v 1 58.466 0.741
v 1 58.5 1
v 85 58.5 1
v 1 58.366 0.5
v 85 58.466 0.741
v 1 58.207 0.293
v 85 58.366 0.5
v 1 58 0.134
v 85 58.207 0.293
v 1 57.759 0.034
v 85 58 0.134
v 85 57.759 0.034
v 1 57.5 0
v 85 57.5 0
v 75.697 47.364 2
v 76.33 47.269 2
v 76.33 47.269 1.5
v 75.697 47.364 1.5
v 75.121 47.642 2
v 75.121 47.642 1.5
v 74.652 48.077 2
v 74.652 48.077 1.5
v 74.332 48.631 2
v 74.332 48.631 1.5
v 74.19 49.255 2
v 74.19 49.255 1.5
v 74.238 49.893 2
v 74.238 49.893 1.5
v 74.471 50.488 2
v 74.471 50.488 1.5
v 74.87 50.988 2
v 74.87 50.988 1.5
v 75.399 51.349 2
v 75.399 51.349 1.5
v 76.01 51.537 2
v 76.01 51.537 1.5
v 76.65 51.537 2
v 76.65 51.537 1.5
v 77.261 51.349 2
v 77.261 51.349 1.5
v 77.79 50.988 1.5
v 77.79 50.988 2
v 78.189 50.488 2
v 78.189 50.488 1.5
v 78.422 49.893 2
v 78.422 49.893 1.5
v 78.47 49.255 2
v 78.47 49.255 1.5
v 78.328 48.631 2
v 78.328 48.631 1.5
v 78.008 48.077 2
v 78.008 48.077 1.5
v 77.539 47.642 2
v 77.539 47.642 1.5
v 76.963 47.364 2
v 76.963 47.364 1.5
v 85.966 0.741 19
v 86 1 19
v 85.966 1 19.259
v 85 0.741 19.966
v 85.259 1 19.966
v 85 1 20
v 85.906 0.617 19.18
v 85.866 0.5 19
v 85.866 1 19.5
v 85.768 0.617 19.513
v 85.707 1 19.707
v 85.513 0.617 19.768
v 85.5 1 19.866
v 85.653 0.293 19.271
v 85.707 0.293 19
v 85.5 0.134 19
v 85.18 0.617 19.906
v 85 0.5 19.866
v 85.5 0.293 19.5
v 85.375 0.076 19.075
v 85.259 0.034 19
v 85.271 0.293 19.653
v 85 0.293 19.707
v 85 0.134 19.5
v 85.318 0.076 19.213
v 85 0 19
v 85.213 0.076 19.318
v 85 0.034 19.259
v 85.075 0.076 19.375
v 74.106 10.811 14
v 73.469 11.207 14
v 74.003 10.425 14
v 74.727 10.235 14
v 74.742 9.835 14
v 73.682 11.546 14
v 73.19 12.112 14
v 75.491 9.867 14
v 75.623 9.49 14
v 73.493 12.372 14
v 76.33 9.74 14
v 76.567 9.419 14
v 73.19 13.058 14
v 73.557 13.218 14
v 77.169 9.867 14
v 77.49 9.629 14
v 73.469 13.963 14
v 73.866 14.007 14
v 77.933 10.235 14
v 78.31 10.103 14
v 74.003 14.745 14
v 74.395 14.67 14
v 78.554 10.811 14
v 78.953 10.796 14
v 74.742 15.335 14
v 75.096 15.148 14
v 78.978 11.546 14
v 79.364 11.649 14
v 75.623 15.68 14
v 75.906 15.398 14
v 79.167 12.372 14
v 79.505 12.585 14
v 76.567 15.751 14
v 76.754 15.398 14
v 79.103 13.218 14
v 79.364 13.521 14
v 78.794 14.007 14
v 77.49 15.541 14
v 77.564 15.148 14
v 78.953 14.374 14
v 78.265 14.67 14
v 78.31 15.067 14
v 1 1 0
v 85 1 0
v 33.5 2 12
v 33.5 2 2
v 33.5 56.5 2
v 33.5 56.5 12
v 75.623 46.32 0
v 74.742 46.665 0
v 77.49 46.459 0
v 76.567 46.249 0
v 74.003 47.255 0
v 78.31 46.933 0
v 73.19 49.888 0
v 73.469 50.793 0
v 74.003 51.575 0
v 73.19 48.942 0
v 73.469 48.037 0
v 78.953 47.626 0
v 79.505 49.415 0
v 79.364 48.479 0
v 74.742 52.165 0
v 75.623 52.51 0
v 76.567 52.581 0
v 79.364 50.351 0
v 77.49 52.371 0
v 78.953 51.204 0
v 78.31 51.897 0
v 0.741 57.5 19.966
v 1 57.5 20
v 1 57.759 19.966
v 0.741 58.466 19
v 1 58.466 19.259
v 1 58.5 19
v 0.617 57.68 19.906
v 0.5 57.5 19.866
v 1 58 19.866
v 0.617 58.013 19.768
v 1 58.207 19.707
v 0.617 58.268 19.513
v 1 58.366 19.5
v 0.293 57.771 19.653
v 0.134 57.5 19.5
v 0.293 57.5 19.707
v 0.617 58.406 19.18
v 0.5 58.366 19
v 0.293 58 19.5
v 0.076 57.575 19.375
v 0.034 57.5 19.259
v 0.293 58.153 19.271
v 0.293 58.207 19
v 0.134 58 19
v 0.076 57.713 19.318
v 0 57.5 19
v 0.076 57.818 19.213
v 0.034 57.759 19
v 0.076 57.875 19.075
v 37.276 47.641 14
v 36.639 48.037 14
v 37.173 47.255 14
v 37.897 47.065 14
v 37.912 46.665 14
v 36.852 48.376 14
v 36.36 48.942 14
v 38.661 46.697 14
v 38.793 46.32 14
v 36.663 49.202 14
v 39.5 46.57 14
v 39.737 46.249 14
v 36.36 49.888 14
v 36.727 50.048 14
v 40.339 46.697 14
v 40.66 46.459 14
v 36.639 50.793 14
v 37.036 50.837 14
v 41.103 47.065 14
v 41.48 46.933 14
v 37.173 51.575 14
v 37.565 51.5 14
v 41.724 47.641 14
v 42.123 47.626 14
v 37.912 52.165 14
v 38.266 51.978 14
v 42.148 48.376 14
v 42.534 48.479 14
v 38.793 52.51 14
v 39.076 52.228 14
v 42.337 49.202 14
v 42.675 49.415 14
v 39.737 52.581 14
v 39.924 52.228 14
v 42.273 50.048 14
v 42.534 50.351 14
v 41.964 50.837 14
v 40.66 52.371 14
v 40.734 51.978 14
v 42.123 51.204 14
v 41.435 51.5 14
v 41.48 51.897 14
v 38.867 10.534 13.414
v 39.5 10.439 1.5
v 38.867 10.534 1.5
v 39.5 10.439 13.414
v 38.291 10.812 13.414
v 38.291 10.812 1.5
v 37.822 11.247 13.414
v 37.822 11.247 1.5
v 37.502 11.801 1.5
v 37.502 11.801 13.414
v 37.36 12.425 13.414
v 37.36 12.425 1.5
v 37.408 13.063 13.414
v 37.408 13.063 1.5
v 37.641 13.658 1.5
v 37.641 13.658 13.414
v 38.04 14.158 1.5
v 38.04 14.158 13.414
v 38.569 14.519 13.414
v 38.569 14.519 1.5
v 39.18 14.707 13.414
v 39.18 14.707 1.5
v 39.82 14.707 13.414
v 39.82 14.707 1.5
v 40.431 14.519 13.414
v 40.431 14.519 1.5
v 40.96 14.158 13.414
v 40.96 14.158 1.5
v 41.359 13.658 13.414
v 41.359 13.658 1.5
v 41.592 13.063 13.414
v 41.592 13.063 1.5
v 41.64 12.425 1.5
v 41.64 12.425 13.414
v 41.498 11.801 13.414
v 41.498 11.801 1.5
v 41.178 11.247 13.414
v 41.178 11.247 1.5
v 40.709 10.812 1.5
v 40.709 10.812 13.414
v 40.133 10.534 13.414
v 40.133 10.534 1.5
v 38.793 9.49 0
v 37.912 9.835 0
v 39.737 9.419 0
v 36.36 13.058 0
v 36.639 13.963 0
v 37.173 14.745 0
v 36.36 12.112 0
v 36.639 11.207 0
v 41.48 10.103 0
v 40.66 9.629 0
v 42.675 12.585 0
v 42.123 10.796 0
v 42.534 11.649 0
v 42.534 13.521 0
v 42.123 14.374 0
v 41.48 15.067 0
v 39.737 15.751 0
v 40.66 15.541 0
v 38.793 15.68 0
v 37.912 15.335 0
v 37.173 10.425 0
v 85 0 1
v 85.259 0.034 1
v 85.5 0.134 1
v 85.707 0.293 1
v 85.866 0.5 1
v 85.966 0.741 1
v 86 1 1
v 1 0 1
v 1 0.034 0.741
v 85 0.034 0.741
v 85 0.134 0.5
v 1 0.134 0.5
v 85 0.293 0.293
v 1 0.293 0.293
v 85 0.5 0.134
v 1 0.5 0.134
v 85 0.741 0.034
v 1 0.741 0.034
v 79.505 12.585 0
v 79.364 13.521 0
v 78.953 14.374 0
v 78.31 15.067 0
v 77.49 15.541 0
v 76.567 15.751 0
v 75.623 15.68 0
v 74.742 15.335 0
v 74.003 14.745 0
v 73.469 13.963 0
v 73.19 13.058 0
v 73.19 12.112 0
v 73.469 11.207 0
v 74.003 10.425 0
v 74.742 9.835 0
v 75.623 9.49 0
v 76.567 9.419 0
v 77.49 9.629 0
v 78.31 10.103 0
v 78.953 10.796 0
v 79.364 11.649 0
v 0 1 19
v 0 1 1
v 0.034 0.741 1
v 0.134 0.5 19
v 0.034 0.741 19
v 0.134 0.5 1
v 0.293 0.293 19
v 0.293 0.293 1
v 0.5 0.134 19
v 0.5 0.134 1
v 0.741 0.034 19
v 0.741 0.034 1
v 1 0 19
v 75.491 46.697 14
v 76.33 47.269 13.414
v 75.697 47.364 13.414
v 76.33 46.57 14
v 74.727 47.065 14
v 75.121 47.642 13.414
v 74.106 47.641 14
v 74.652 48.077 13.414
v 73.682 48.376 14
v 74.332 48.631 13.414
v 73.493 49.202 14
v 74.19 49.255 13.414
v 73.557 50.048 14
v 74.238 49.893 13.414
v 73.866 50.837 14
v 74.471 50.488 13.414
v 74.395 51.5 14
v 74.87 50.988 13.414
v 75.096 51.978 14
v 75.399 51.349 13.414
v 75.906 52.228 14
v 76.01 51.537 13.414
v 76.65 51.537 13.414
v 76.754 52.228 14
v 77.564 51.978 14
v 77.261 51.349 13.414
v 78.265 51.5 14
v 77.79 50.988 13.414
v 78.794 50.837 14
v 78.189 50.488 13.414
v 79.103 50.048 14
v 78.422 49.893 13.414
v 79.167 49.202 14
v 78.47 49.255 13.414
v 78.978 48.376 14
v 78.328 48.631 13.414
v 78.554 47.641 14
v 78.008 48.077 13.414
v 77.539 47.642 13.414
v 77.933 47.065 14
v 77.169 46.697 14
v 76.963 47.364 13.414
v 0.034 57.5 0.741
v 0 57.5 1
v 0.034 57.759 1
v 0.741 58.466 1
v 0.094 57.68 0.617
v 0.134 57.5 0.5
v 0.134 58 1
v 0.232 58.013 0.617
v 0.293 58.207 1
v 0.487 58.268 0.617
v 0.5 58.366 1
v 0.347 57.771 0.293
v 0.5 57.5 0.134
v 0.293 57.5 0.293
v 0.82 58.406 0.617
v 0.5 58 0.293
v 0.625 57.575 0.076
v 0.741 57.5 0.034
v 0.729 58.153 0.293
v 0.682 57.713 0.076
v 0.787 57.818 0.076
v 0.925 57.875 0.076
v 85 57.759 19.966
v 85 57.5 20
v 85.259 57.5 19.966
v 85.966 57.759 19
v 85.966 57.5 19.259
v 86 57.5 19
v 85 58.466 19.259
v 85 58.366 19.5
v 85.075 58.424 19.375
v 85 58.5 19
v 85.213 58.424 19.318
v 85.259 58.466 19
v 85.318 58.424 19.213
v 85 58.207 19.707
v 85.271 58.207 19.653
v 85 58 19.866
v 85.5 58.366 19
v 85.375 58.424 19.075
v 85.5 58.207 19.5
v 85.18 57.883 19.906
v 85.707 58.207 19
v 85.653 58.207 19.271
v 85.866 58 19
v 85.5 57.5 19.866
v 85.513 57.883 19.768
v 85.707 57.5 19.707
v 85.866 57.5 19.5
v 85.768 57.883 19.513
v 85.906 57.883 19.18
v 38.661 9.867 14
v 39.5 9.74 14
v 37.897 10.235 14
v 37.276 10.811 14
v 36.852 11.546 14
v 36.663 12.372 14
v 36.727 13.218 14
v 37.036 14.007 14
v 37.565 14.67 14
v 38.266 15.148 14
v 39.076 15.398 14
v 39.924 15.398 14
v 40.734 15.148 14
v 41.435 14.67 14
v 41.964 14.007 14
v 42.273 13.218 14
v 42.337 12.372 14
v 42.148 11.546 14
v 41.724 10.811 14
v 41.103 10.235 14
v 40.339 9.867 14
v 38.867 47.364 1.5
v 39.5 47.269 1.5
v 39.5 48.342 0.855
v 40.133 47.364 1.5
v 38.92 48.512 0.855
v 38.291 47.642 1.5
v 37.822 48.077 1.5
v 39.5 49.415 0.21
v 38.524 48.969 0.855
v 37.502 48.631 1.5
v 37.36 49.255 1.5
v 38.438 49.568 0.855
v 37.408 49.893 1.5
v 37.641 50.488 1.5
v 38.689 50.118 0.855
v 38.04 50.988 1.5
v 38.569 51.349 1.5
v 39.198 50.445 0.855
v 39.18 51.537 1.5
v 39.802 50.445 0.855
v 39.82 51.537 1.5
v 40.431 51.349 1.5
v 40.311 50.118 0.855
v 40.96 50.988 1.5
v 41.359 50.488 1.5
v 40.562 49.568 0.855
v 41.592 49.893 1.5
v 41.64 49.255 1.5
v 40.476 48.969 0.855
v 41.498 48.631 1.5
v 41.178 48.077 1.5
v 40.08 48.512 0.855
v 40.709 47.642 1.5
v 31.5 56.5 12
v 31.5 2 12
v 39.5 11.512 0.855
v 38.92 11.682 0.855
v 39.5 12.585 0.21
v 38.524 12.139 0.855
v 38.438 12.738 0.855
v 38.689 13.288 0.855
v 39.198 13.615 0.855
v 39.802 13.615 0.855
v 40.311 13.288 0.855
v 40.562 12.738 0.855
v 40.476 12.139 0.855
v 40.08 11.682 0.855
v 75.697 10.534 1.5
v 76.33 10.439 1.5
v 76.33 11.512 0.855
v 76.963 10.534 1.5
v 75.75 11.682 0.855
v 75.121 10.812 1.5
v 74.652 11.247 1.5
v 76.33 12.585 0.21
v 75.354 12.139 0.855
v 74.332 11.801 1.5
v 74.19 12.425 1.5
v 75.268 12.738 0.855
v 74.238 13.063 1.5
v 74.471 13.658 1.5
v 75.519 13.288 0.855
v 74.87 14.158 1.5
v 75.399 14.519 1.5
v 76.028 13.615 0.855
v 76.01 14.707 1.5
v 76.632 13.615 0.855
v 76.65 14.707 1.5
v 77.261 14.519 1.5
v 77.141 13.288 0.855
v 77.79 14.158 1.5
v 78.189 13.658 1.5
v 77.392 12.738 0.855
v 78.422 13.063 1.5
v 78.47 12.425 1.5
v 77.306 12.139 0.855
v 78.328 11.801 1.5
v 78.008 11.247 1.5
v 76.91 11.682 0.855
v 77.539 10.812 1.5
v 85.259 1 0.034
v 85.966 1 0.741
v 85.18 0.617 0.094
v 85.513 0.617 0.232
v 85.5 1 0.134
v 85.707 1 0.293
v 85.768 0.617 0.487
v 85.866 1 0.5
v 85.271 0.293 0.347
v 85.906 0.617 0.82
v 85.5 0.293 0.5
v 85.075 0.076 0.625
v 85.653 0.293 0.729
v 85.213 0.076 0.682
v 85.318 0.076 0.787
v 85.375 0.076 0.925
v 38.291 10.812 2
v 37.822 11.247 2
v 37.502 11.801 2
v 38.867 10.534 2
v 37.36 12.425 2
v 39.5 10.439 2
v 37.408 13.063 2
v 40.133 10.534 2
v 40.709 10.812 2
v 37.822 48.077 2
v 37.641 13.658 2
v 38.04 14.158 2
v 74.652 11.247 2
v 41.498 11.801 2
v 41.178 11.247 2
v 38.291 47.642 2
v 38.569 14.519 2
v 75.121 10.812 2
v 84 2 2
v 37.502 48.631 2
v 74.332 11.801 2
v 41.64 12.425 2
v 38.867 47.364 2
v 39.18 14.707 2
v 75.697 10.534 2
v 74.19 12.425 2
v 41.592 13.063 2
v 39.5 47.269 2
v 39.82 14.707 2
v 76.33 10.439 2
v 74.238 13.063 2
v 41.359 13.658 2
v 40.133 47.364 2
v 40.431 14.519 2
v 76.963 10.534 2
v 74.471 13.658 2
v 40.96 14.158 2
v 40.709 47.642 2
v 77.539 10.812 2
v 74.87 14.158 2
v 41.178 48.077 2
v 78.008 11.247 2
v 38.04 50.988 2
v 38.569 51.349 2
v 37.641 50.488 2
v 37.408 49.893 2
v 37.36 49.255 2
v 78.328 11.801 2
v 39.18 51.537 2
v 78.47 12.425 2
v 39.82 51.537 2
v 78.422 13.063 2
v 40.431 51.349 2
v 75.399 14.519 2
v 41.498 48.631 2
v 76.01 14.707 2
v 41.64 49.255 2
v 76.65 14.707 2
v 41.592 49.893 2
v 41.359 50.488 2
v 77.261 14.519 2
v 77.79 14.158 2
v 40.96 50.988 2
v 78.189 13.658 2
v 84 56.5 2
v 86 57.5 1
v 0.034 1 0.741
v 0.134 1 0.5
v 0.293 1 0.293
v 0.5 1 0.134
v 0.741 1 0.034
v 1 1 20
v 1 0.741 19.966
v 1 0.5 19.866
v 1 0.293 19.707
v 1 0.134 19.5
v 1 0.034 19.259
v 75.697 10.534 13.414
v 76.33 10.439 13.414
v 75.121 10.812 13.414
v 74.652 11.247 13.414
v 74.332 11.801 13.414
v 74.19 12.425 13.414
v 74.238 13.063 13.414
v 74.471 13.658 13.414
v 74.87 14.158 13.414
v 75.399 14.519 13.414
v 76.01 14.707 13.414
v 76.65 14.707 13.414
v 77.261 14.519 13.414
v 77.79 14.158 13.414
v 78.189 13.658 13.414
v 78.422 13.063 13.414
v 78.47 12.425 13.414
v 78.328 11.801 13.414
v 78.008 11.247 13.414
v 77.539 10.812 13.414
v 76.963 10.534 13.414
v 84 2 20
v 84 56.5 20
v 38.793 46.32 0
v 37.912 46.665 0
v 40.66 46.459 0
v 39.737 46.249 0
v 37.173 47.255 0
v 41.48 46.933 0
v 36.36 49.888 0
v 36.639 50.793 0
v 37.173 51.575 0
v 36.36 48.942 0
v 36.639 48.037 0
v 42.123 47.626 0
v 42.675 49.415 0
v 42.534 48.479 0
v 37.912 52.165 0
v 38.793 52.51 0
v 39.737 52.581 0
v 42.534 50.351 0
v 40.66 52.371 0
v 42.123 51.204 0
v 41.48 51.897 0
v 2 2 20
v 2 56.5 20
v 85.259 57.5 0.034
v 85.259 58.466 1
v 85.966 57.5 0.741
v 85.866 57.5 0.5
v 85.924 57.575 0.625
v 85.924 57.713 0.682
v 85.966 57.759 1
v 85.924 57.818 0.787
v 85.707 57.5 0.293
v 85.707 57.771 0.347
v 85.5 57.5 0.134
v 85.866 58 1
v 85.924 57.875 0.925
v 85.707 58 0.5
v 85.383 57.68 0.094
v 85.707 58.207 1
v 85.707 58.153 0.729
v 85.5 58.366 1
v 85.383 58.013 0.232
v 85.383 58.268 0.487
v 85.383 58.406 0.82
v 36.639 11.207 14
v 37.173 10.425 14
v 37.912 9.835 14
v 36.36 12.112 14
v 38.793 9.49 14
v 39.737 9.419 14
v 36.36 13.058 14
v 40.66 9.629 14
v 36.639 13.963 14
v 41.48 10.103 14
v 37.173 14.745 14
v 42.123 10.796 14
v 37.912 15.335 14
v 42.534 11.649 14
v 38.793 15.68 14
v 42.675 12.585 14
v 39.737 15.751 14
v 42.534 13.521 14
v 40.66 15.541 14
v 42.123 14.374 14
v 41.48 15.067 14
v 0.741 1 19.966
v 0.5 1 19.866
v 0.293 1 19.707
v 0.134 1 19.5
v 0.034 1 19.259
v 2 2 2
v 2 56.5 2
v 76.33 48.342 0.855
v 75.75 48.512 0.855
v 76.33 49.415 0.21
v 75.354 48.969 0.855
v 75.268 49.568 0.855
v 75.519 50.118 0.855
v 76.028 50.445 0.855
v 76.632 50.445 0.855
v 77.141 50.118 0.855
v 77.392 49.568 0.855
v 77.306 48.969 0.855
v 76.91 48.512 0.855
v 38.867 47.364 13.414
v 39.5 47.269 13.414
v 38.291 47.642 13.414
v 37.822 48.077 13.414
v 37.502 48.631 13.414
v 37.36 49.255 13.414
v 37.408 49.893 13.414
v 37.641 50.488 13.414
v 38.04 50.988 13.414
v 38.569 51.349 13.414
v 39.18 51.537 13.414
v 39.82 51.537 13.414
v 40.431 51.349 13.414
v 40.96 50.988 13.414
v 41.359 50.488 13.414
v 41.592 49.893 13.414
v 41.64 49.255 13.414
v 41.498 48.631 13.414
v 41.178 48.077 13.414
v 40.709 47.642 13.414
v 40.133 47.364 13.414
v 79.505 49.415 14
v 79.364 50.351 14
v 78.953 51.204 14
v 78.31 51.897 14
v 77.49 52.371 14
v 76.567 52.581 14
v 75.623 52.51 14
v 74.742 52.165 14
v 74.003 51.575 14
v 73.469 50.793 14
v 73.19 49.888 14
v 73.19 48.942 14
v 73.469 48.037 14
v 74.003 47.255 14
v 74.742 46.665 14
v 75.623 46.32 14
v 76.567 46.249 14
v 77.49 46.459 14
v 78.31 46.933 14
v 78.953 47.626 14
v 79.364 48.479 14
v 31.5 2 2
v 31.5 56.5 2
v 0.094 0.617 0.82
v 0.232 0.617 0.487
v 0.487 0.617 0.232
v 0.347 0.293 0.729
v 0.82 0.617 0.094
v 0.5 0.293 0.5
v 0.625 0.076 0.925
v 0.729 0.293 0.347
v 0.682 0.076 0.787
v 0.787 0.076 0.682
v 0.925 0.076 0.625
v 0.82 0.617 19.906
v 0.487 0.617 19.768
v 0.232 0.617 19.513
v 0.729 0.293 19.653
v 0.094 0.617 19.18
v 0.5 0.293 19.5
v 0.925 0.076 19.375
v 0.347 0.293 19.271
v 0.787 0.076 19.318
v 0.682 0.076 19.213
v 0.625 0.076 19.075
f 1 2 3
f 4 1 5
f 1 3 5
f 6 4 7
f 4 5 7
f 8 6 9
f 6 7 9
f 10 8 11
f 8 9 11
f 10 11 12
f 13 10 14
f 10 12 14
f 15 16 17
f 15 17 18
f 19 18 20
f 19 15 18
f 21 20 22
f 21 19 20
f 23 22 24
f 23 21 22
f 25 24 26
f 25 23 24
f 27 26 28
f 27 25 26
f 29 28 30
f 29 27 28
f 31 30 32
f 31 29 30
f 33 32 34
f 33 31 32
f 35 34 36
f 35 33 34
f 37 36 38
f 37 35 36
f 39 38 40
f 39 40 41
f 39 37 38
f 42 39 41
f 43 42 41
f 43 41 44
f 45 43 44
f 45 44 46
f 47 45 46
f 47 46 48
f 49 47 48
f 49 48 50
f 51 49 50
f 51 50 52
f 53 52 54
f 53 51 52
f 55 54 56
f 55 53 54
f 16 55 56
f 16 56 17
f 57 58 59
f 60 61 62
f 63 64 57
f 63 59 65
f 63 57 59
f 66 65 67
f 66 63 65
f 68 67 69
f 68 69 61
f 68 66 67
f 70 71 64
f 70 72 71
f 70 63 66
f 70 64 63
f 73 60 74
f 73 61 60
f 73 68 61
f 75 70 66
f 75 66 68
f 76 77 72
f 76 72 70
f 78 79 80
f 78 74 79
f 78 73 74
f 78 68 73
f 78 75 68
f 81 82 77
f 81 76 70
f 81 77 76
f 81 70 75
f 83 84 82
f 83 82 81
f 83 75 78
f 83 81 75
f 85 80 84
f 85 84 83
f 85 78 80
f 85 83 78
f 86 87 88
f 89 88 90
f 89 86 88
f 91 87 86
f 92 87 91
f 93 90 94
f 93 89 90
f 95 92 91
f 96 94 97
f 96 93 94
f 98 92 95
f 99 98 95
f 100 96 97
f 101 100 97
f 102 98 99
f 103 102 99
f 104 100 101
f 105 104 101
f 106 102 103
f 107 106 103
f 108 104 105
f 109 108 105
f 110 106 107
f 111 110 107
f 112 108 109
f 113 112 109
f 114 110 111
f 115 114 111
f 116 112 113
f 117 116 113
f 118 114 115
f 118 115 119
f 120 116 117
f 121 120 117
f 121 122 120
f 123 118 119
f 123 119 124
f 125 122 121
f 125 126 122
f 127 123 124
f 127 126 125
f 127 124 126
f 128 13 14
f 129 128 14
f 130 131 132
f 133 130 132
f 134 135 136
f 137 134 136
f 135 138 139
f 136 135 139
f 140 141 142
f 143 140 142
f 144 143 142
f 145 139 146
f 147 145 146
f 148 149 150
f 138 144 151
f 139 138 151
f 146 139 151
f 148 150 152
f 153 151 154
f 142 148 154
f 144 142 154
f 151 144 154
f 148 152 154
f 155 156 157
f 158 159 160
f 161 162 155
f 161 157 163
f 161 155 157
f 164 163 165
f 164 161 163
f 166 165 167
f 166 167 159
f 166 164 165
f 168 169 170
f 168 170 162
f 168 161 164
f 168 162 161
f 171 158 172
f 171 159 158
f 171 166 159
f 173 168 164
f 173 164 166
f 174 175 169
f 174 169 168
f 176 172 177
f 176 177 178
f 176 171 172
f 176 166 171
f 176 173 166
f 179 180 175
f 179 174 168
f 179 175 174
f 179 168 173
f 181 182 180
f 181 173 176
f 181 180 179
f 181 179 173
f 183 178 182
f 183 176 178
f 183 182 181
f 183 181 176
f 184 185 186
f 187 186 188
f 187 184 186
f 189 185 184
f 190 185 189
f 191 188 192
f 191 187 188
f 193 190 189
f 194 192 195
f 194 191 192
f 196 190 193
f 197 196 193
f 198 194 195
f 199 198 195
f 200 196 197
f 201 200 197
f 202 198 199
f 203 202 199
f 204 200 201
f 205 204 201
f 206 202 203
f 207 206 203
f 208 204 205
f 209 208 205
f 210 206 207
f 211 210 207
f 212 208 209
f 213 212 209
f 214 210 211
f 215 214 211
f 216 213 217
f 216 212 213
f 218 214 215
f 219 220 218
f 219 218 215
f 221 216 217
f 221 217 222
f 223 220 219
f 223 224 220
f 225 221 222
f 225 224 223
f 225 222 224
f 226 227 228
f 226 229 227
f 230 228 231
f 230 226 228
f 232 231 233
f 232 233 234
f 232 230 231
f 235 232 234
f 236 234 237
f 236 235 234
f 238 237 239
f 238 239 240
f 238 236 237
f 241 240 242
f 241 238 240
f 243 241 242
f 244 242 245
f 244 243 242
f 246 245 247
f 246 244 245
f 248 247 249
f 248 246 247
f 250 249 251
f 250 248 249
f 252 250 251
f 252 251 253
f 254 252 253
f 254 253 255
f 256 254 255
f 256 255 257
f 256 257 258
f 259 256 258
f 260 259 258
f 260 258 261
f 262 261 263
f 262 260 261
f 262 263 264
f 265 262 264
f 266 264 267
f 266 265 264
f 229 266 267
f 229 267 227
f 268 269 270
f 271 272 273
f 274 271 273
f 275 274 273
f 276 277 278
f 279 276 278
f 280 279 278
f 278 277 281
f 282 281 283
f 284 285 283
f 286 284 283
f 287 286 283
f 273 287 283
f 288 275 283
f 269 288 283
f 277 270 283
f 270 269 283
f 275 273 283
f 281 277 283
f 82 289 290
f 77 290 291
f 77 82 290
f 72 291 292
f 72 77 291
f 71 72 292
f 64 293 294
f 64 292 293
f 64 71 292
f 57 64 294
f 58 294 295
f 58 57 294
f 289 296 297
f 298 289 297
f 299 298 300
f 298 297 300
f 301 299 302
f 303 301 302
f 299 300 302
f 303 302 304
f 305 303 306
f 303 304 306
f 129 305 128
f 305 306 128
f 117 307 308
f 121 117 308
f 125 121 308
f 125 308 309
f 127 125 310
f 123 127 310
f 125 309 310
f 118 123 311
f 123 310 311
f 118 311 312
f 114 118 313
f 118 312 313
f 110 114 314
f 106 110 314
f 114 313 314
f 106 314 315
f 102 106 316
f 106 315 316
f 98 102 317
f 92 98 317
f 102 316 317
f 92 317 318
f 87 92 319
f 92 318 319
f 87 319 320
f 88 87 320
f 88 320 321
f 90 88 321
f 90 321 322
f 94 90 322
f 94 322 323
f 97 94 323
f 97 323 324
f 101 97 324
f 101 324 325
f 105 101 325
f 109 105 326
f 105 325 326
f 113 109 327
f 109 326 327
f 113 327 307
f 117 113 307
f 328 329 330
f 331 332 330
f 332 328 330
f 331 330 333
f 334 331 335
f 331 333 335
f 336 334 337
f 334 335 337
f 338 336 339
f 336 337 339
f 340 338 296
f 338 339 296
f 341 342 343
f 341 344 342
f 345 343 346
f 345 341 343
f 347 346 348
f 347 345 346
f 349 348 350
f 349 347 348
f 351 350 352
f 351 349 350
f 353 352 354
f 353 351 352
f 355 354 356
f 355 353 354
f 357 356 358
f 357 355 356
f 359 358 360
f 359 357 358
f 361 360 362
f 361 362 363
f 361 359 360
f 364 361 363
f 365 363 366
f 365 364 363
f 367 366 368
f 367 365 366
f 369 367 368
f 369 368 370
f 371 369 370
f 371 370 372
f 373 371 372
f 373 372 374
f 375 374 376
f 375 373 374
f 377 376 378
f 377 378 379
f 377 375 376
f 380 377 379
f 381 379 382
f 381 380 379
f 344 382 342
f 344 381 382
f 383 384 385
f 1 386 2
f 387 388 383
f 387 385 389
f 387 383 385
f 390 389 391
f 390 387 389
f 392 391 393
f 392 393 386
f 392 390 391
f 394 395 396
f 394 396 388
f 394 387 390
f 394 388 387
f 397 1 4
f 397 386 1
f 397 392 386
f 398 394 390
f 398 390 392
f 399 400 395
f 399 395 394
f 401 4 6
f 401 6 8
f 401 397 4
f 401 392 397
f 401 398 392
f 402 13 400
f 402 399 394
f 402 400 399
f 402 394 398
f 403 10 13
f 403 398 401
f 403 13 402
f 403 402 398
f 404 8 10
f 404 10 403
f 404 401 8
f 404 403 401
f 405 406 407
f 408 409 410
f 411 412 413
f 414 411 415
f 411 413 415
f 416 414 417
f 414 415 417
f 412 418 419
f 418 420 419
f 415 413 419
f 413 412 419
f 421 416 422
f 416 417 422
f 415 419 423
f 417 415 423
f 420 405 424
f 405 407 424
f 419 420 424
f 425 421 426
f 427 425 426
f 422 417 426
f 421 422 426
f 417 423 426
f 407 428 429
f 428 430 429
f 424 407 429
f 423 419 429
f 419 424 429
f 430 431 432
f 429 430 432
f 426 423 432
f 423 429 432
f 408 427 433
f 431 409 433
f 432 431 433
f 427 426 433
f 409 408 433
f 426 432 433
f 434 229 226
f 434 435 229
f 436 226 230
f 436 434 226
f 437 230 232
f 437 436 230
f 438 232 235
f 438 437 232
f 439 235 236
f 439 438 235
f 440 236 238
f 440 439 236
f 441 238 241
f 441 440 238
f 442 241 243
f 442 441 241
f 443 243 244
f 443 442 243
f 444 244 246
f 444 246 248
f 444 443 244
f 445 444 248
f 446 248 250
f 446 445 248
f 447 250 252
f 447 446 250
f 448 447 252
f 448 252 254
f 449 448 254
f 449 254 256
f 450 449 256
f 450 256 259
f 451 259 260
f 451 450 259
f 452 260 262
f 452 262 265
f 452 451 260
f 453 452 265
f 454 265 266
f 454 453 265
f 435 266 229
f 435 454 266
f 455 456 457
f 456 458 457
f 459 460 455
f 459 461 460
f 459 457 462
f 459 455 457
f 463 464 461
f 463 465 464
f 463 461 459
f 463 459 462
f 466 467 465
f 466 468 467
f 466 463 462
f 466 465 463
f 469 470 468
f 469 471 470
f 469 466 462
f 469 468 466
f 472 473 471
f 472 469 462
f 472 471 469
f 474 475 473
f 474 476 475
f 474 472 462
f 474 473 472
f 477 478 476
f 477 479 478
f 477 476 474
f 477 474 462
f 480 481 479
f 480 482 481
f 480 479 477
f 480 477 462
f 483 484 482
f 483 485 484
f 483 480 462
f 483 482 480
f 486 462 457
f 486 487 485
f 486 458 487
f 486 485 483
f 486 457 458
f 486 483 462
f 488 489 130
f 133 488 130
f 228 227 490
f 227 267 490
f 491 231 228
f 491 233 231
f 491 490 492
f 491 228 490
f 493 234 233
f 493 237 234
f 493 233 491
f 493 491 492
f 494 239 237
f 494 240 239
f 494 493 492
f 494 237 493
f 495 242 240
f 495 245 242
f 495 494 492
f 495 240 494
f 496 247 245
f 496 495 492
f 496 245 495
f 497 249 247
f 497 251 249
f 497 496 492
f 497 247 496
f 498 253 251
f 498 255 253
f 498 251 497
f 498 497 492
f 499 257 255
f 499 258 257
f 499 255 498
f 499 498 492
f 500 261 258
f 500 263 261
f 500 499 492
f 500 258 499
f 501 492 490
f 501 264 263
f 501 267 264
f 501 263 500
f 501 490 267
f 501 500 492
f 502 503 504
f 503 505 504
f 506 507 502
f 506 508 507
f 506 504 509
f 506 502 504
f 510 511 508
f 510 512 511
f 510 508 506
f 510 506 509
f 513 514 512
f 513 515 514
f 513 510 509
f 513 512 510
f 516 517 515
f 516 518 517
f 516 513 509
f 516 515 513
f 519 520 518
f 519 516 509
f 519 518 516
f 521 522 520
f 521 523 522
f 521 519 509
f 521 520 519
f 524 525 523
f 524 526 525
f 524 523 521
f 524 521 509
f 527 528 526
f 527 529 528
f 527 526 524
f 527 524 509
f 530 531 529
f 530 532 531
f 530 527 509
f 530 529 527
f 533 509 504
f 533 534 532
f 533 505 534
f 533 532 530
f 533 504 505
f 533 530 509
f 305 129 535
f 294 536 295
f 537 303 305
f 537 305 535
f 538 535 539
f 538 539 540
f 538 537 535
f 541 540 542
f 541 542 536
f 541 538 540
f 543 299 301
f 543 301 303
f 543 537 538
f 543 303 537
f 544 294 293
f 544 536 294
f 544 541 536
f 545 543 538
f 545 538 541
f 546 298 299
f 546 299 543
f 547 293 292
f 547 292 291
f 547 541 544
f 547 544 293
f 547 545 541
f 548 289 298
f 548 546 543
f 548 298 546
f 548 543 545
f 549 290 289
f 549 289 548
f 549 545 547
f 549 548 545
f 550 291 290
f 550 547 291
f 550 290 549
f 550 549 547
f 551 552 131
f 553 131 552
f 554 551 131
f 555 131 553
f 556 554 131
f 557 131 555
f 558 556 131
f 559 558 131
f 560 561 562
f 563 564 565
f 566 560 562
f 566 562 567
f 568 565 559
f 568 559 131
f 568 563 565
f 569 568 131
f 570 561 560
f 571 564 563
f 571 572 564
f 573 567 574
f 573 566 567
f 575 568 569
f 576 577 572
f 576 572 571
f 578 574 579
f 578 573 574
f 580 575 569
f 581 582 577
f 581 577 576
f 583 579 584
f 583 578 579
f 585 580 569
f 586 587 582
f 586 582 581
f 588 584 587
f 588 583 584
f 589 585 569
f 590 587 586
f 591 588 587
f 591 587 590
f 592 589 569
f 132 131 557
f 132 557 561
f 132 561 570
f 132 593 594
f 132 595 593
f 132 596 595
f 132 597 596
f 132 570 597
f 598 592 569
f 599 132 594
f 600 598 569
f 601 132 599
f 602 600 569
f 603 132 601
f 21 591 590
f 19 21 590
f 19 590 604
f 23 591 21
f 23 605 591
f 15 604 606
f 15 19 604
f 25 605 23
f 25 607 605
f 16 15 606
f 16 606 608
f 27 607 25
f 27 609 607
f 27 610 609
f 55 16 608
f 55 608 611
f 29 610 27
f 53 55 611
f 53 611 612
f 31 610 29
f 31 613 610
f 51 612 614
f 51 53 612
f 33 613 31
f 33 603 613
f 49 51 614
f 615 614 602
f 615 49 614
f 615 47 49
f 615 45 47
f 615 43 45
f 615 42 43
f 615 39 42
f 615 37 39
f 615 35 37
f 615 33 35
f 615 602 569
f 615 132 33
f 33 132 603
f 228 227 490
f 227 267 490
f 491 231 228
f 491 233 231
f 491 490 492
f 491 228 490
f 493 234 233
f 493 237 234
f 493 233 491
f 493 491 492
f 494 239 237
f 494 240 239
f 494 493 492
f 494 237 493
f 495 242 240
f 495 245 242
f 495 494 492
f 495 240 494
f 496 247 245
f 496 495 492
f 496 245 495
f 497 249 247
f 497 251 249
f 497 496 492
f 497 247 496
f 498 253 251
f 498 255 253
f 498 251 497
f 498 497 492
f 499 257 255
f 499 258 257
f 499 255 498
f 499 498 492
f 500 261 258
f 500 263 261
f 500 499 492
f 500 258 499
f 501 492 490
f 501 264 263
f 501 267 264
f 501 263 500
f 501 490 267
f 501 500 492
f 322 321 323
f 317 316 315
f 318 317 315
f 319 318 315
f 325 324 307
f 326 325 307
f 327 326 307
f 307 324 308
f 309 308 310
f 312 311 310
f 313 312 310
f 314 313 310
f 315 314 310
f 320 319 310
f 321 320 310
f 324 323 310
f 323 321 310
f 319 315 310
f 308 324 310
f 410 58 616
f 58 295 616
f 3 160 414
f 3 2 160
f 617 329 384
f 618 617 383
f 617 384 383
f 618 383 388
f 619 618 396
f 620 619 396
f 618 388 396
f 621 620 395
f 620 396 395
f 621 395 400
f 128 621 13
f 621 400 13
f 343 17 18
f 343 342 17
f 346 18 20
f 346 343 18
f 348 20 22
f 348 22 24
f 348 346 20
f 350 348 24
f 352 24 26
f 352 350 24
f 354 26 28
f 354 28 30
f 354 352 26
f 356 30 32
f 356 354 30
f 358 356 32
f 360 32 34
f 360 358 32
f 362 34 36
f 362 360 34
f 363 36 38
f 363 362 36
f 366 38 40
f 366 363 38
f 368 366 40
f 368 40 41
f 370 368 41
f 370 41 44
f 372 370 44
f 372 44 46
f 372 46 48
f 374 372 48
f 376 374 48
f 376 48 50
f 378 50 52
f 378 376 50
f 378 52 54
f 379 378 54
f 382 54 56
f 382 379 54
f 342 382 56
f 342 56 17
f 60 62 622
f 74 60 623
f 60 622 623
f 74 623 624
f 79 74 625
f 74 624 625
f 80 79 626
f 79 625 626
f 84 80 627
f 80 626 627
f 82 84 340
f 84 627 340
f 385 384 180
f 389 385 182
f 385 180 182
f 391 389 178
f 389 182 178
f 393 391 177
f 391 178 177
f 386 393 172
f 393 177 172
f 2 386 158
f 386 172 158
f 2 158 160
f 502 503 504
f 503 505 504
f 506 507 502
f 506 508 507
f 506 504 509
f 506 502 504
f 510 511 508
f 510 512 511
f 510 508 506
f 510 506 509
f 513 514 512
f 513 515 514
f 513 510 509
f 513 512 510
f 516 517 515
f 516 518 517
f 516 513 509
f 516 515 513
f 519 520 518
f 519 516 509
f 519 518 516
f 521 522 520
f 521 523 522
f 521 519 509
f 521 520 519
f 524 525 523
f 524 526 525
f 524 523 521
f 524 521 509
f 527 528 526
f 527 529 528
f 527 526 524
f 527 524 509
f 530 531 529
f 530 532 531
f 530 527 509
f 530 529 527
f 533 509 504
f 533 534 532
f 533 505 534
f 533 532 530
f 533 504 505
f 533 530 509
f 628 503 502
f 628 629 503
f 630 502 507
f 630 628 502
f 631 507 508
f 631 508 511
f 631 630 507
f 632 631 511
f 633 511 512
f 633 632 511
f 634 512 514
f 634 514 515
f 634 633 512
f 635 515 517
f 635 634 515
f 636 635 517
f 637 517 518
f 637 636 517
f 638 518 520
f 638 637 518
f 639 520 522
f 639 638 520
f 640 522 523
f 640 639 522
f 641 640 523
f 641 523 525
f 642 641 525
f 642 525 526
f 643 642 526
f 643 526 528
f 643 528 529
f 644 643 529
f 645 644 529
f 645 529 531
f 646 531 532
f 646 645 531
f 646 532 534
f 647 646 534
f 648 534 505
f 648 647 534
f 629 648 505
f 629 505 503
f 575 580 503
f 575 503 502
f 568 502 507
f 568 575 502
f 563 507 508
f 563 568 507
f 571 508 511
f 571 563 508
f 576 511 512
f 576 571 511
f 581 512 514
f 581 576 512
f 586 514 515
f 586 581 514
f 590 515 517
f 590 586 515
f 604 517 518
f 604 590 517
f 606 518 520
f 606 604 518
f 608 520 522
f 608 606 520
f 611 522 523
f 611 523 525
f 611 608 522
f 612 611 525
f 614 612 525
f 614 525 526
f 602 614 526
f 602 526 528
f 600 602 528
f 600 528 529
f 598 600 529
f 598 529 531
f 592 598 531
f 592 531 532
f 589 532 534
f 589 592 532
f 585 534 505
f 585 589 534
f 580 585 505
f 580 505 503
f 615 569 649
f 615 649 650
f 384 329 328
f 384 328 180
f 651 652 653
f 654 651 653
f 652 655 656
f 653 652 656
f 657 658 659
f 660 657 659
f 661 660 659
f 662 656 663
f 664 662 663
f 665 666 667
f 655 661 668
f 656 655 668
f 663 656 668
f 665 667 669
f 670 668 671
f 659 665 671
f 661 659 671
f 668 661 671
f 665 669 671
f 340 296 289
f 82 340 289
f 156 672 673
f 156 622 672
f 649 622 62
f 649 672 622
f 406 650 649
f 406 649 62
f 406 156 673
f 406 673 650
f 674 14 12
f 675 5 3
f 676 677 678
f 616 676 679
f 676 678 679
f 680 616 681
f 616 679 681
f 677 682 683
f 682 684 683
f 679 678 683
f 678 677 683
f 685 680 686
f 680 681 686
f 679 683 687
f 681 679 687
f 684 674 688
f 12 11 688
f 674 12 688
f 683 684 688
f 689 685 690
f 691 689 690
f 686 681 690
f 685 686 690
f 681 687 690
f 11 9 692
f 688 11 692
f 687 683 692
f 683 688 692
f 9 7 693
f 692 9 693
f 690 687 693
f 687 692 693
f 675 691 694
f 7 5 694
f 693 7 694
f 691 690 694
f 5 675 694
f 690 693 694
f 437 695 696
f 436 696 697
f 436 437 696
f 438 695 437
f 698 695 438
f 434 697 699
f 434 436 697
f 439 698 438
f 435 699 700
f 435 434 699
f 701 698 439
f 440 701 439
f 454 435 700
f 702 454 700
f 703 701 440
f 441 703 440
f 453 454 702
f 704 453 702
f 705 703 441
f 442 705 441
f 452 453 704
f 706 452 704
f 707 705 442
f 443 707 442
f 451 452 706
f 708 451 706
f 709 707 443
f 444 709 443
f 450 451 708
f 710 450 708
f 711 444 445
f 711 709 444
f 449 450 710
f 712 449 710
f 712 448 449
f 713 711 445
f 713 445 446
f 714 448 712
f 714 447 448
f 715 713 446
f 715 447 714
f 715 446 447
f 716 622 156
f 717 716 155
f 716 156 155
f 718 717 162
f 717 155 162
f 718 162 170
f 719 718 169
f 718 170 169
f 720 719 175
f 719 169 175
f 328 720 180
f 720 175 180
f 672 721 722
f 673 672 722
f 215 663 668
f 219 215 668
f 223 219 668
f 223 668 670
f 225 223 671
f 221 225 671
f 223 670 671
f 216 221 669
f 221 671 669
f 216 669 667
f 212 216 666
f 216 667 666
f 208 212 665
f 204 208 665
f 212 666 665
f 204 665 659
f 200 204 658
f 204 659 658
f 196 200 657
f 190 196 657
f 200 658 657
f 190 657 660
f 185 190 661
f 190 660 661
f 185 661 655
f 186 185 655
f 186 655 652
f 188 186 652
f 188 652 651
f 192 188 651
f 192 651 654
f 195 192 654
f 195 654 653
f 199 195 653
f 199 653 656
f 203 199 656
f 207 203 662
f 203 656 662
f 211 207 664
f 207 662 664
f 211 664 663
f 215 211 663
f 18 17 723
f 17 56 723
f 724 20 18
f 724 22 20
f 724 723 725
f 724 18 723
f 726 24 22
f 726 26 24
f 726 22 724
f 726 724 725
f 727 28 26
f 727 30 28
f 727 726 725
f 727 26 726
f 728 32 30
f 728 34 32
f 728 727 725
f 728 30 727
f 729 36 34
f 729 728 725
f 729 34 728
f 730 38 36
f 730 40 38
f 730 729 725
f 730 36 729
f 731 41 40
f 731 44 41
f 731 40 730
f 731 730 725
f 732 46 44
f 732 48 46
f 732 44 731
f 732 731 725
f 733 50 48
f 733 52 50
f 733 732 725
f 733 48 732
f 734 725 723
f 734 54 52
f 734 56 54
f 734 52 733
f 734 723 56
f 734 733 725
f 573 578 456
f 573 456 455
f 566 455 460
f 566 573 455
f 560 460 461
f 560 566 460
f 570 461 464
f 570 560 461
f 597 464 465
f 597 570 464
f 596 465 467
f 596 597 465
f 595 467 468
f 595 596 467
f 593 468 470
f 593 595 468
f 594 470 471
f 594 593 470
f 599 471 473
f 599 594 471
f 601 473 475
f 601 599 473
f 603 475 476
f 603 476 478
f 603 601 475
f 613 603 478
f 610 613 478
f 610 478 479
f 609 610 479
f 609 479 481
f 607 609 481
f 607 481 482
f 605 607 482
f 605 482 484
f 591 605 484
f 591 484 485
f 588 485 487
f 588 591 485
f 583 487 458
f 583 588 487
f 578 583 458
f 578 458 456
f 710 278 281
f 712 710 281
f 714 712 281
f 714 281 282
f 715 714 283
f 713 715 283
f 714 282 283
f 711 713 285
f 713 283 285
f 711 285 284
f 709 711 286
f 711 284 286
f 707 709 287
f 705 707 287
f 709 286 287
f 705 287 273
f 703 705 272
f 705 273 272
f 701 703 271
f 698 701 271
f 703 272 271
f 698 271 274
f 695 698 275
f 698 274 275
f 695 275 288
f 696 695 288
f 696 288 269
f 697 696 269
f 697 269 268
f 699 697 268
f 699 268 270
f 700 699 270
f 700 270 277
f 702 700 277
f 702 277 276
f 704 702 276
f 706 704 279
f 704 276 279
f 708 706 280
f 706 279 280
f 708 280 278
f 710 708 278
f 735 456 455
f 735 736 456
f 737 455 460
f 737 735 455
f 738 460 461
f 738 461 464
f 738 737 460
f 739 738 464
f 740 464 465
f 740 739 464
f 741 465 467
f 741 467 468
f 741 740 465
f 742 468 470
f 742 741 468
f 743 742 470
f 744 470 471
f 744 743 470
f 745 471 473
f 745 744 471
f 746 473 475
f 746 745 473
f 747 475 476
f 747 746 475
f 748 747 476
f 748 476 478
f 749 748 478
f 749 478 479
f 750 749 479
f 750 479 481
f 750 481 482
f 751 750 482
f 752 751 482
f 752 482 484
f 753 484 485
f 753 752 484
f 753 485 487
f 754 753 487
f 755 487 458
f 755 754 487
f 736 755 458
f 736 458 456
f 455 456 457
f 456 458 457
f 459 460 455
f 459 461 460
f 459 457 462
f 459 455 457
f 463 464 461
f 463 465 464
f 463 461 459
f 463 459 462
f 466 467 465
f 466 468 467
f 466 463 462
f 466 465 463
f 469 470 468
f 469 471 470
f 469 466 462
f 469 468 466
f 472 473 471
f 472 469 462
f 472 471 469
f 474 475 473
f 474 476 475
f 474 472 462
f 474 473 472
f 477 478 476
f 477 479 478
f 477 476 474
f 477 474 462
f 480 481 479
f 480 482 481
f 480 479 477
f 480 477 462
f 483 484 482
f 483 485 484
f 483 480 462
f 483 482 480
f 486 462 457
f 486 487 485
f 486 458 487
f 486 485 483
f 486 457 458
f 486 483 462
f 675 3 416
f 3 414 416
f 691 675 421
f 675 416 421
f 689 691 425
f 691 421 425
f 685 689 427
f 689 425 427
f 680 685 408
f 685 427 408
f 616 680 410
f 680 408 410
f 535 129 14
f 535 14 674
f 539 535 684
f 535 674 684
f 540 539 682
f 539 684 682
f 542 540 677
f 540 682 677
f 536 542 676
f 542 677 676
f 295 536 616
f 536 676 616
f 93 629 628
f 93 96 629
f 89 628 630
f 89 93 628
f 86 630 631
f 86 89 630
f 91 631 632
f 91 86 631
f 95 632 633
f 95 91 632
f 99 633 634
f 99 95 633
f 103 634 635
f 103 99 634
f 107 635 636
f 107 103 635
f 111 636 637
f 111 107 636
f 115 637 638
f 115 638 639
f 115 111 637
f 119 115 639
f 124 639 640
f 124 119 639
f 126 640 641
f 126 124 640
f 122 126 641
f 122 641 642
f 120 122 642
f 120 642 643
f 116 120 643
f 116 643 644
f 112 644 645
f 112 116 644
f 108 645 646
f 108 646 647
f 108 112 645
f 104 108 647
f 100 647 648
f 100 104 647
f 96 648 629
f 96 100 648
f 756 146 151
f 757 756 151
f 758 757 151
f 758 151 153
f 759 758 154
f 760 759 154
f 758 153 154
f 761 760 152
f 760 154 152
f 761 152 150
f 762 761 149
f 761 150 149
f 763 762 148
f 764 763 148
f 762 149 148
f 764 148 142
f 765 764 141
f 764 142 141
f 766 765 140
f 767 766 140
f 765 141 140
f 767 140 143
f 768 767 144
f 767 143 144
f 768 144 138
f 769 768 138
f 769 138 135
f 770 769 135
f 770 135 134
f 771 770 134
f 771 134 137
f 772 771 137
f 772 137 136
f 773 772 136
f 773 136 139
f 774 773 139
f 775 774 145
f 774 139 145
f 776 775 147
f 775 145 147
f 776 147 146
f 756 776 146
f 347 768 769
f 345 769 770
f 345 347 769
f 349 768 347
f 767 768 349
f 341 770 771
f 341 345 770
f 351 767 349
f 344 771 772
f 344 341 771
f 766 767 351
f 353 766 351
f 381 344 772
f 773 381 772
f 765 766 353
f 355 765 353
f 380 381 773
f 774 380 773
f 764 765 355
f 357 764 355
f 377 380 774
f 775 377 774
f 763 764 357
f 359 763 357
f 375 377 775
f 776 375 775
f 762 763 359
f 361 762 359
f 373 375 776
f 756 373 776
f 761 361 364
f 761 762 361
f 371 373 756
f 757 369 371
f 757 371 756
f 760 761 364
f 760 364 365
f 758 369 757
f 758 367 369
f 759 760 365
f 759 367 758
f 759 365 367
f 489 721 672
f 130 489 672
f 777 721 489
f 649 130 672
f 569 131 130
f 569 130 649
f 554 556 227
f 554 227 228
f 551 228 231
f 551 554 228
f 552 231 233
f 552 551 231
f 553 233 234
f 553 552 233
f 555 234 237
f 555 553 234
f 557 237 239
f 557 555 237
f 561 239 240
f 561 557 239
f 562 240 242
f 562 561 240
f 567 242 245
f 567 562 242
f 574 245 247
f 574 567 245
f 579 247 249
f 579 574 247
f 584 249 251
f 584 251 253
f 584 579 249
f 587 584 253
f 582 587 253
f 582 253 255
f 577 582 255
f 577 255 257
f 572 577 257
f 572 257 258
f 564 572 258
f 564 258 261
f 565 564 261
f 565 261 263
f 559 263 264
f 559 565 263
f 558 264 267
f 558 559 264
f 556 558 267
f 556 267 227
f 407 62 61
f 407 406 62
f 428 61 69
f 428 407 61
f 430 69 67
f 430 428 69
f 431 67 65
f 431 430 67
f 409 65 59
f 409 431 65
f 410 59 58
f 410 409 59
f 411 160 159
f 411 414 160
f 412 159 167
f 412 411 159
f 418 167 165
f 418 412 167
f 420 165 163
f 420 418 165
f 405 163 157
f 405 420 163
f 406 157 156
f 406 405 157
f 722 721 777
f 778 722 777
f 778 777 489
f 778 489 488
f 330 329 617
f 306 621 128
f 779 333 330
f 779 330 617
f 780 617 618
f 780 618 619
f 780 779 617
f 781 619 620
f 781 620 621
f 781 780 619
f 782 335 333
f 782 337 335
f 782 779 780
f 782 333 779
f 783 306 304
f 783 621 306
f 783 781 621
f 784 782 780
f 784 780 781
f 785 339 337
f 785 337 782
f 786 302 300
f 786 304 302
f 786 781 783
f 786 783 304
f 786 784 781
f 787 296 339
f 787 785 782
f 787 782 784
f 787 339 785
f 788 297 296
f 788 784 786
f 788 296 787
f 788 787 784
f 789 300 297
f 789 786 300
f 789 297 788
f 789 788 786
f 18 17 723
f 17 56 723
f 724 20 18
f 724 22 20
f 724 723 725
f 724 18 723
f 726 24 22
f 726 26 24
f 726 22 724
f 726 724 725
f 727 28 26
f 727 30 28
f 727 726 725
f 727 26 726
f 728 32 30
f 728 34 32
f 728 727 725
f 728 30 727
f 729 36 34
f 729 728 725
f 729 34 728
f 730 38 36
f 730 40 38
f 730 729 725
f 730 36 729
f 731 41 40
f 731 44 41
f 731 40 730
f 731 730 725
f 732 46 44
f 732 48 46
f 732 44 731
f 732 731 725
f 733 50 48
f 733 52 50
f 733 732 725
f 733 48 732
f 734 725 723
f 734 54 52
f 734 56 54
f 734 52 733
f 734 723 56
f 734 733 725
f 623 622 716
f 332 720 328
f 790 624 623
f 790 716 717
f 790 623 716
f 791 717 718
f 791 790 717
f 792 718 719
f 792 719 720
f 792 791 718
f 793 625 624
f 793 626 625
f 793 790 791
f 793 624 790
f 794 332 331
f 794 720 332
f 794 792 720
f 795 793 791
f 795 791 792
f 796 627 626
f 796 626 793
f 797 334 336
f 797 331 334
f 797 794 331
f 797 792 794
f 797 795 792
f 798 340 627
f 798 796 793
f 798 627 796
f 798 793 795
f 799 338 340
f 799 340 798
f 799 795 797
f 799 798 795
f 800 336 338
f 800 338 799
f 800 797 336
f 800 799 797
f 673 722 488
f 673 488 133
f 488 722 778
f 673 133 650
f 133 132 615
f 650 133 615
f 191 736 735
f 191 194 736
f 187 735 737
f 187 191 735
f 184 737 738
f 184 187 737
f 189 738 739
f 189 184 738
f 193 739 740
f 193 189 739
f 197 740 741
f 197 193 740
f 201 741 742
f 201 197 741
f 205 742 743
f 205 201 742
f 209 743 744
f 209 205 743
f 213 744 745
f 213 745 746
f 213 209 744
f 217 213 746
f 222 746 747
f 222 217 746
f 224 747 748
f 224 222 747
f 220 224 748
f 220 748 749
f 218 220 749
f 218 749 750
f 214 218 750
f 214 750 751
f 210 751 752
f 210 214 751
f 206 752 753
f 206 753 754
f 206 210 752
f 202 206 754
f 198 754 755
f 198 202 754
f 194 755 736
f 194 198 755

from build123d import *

# Parameters (mm, degrees)
SKETCH1_W                           = 86
SKETCH1_H                           = 58.5
BOSS_EXTRUDE1_DEPTH                 = 20
SHELL1_T                            = -2
SKETCH4_W                           = 2
SKETCH4_H                           = 54.5
BOSS_EXTRUDE2_DEPTH                 = 10
FILLET2_R                           = 1
FILLET3_R                           = 1
SKETCH22_R                          = 3.175
BOSS_EXTRUDE10_DEPTH                = 14
BOSS_EXTRUDE10_2_DEPTH              = 14
BOSS_EXTRUDE10_3_DEPTH              = 14
BOSS_EXTRUDE10_4_DEPTH              = 14
F_4_0_209_DIAMETER_HOLE3_AT_2_COUNT = 2
F_4_0_209_DIAMETER_HOLE3_AT_2_PITCH = 36.83
F_4_0_209_DIAMETER_HOLE3_AT_3_COUNT = 2
F_4_0_209_DIAMETER_HOLE3_AT_3_PITCH = 52.085485502
F_4_0_209_DIAMETER_HOLE3_AT_4_COUNT = 2
F_4_0_209_DIAMETER_HOLE3_AT_4_PITCH = 36.83


with BuildPart() as part:
    # Sketch1 → Boss-Extrude1 (new body)
    with BuildSketch(Plane.XY):
        with Locations((43, 29.25)):
            Rectangle(SKETCH1_W, SKETCH1_H)
    extrude(amount=BOSS_EXTRUDE1_DEPTH)

    # Shell1
    shell1_openings = [part.faces().sort_by_distance(p)[0] for p in [
        (43, 29.25, 20),
    ]]
    offset(amount=SHELL1_T, openings=shell1_openings, kind=Kind.INTERSECTION)

    # Sketch4 → Boss-Extrude2 (add)
    with BuildSketch(Plane.XY.offset(2)):
        with Locations((32.5, 29.25)):
            Rectangle(SKETCH4_W, SKETCH4_H)
    extrude(amount=BOSS_EXTRUDE2_DEPTH)

    # Fillet2
    fillet2_edges = [part.edges().sort_by_distance(p)[0] for p in [
        (86, 29.25, 20),
        (43, 58.5, 20),
        (43, 58.5, 0),
        (86, 29.25, 0),
        (0, 58.5, 10),
        (86, 58.5, 10),
        (86, 0, 10),
    ]]
    fillet(fillet2_edges, radius=FILLET2_R)

    # Fillet3
    # the kernel refuses this fillet: 1 mm, written as the material it takes off along each edge
    with BuildSketch(Plane(origin=(85, 1, 1), x_dir=(0, 0, -1), z_dir=(0, -1, 0))) as fillet3_piece_1_section:
        Polygon((0, 0), (FILLET3_R, 0), (FILLET3_R, FILLET3_R), (0, FILLET3_R), align=None)
    fillet3_piece_1 = extrude(amount=FILLET3_R, mode=Mode.PRIVATE)
    fillet3_piece_1 = fillet3_piece_1 - Plane(origin=(85, 1, 1), x_dir=(-0.7071067811865475, 0, 0.7071067811865475), z_dir=(0, -1, 0)) * Sphere(FILLET3_R, mode=Mode.PRIVATE)
    add(fillet3_piece_1, mode=Mode.SUBTRACT)
    with BuildSketch(Plane(origin=(85, 1, 19), x_dir=(0, 0, 1), z_dir=(0, -1, 0))) as fillet3_piece_2_section:
        Polygon((0, 0), (FILLET3_R, 0), (FILLET3_R, -FILLET3_R), (0, -FILLET3_R), align=None)
    fillet3_piece_2 = extrude(amount=FILLET3_R, mode=Mode.PRIVATE)
    fillet3_piece_2 = fillet3_piece_2 - Plane(origin=(85, 1, 19), x_dir=(-0.7071067811865475, 0, -0.7071067811865475), z_dir=(0, -1, 0)) * Sphere(FILLET3_R, mode=Mode.PRIVATE)
    add(fillet3_piece_2, mode=Mode.SUBTRACT)
    with BuildSketch(Plane(origin=(1, 57.5, 1), x_dir=(-1, 0, 0), z_dir=(0, 0, -1))) as fillet3_piece_3_section:
        Polygon((0, 0), (FILLET3_R, 0), (FILLET3_R, FILLET3_R), (0, FILLET3_R), align=None)
    fillet3_piece_3 = extrude(amount=FILLET3_R, mode=Mode.PRIVATE)
    fillet3_piece_3 = fillet3_piece_3 - Plane(origin=(1, 57.5, 1), x_dir=(0.7071067811865475, -0.7071067811865475, 0), z_dir=(0, 0, -1)) * Sphere(FILLET3_R, mode=Mode.PRIVATE)
    add(fillet3_piece_3, mode=Mode.SUBTRACT)
    with BuildSketch(Plane(origin=(1, 57.5, 19), x_dir=(0, 0, 1), z_dir=(-1, 0, 0))) as fillet3_piece_4_section:
        Polygon((0, 0), (FILLET3_R, 0), (FILLET3_R, FILLET3_R), (0, FILLET3_R), align=None)
    fillet3_piece_4 = extrude(amount=FILLET3_R, mode=Mode.PRIVATE)
    fillet3_piece_4 = fillet3_piece_4 - Plane(origin=(1, 57.5, 19), x_dir=(0, -0.7071067811865475, -0.7071067811865475), z_dir=(-1, 0, 0)) * Sphere(FILLET3_R, mode=Mode.PRIVATE)
    add(fillet3_piece_4, mode=Mode.SUBTRACT)
    with BuildSketch(Plane(origin=(1, 1, 19), x_dir=(-1, 0, 0), z_dir=(0, -1, 0))) as fillet3_piece_5_section:
        Polygon((0, 0), (FILLET3_R, 0), (FILLET3_R, -FILLET3_R), (0, -FILLET3_R), align=None)
    fillet3_piece_5 = extrude(amount=FILLET3_R, mode=Mode.PRIVATE)
    fillet3_piece_5 = fillet3_piece_5 - Plane(origin=(1, 1, 19), x_dir=(0.7071067811865475, 0, -0.7071067811865475), z_dir=(0, -1, 0)) * Sphere(FILLET3_R, mode=Mode.PRIVATE)
    add(fillet3_piece_5, mode=Mode.SUBTRACT)
    with BuildSketch(Plane(origin=(1, 1, 1), x_dir=(0, 0, -1), z_dir=(0, -1, 0))) as fillet3_piece_6_section:
        Polygon((0, 0), (FILLET3_R, 0), (FILLET3_R, -FILLET3_R), (0, -FILLET3_R), align=None)
    fillet3_piece_6 = extrude(amount=FILLET3_R, mode=Mode.PRIVATE)
    fillet3_piece_6 = fillet3_piece_6 - Plane(origin=(1, 1, 1), x_dir=(0.7071067811865475, 0, 0.7071067811865475), z_dir=(0, -1, 0)) * Sphere(FILLET3_R, mode=Mode.PRIVATE)
    add(fillet3_piece_6, mode=Mode.SUBTRACT)
    with BuildSketch(Plane(origin=(0, 57.5, 20), x_dir=(0, 0, -1), z_dir=(0, -1, 0)), Plane(origin=(0, 57.5, 0), x_dir=(1, 0, 0), z_dir=(0, -1, 0))) as fillet3_piece_7:
        with BuildLine():
            CenterArc((FILLET3_R, FILLET3_R), FILLET3_R, 180, 90)
            Line((0, FILLET3_R), (0, 0))
            Line((0, 0), (FILLET3_R, 0))
        make_face()
    extrude(amount=56.5, mode=Mode.SUBTRACT)
    with BuildSketch(Plane(origin=(1, 0, 0), x_dir=(0, 0, 1), z_dir=(1, 0, 0))) as fillet3_piece_8:
        with BuildLine():
            CenterArc((FILLET3_R, -FILLET3_R), FILLET3_R, 90, 90)
            Line((0, -FILLET3_R), (0, 0))
            Line((0, 0), (FILLET3_R, 0))
        make_face()
    extrude(amount=84, mode=Mode.SUBTRACT)
    with BuildSketch(Plane(origin=(1, 0, 20), x_dir=(0, 0, -1), z_dir=(1, 0, 0))) as fillet3_piece_9:
        with BuildLine():
            CenterArc((FILLET3_R, FILLET3_R), FILLET3_R, 180, 90)
            Line((0, FILLET3_R), (0, 0))
            Line((0, 0), (FILLET3_R, 0))
        make_face()
    extrude(amount=84, mode=Mode.SUBTRACT)
    with BuildSketch(Plane(origin=(0, 0, 1), x_dir=(1, 0, 0), z_dir=(0, 0, 1))) as fillet3_piece_10:
        with BuildLine():
            CenterArc((FILLET3_R, FILLET3_R), FILLET3_R, 180, 90)
            Line((0, FILLET3_R), (0, 0))
            Line((0, 0), (FILLET3_R, 0))
        make_face()
    extrude(amount=18, mode=Mode.SUBTRACT)


with BuildPart() as body_2:
    # Sketch22 → Boss-Extrude10 (new body)
    with BuildSketch(Plane.XY):
        with Locations((39.5, 49.415)):
            Circle(SKETCH22_R)
    extrude(amount=BOSS_EXTRUDE10_DEPTH)


with BuildPart() as body_3:
    # Sketch22 → Boss-Extrude10 2 (new body)
    with BuildSketch(Plane.XY):
        with Locations((76.33, 49.415)):
            Circle(SKETCH22_R)
    extrude(amount=BOSS_EXTRUDE10_2_DEPTH)


with BuildPart() as body_4:
    # Sketch22 → Boss-Extrude10 3 (new body)
    with BuildSketch(Plane.XY):
        with Locations((39.5, 12.585)):
            Circle(SKETCH22_R)
    extrude(amount=BOSS_EXTRUDE10_3_DEPTH)


with BuildPart() as body_5:
    # Sketch22 → Boss-Extrude10 4 (new body)
    with BuildSketch(Plane.XY):
        with Locations((76.33, 12.585)):
            Circle(SKETCH22_R)
    extrude(amount=BOSS_EXTRUDE10_4_DEPTH)


with BuildPart() as f_4_0_209_diameter_hole3_tool:
    # Sketch28 → #4 (0.209) Diameter Hole3 (revolve)
    with BuildSketch(Plane(origin=(39.5, 49.415, 14), x_dir=(0, -1, 0), z_dir=(1, 0, 0))):
        Polygon((0, 0), (0, 13.789627147), (2.1463, 12.5), (2.1463, 0.586111092), (2.8448, 0), align=None)
    f_4_0_209_diameter_hole3 = revolve(axis=Axis((39.5, 49.415, 20.35), (0, 0, -1)))


with BuildPart() as part_1:
    add(part.part)

    # #4 (0.209) Diameter Hole3: cut by f_4_0_209_diameter_hole3_tool
    add(f_4_0_209_diameter_hole3_tool.part, mode=Mode.SUBTRACT)


with BuildPart() as body_2_1:
    add(body_2.part)

    # #4 (0.209) Diameter Hole3: cut by f_4_0_209_diameter_hole3_tool
    add(f_4_0_209_diameter_hole3_tool.part, mode=Mode.SUBTRACT)


with BuildPart() as f_4_0_209_diameter_hole3_at_2_tool:
    # #4 (0.209) Diameter Hole3 at 2: #4 (0.209) Diameter Hole3 ×2
    with Locations(*[(0, -i * F_4_0_209_DIAMETER_HOLE3_AT_2_PITCH, 0) for i in range(1, F_4_0_209_DIAMETER_HOLE3_AT_2_COUNT)]):
        add(f_4_0_209_diameter_hole3)


with BuildPart() as part_2:
    add(part_1.part)

    # #4 (0.209) Diameter Hole3 at 2: cut by f_4_0_209_diameter_hole3_at_2_tool
    add(f_4_0_209_diameter_hole3_at_2_tool.part, mode=Mode.SUBTRACT)


with BuildPart() as body_4_1:
    add(body_4.part)

    # #4 (0.209) Diameter Hole3 at 2: cut by f_4_0_209_diameter_hole3_at_2_tool
    add(f_4_0_209_diameter_hole3_at_2_tool.part, mode=Mode.SUBTRACT)


with BuildPart() as f_4_0_209_diameter_hole3_at_3_tool:
    # #4 (0.209) Diameter Hole3 at 3: #4 (0.209) Diameter Hole3 ×2
    with Locations(*[Vector(0.7071067811865478, -0.7071067811865474, 0) * (i * F_4_0_209_DIAMETER_HOLE3_AT_3_PITCH) for i in range(1, F_4_0_209_DIAMETER_HOLE3_AT_3_COUNT)]):
        add(f_4_0_209_diameter_hole3)


with BuildPart() as part_3:
    add(part_2.part)

    # #4 (0.209) Diameter Hole3 at 3: cut by f_4_0_209_diameter_hole3_at_3_tool
    add(f_4_0_209_diameter_hole3_at_3_tool.part, mode=Mode.SUBTRACT)


with BuildPart() as body_5_1:
    add(body_5.part)

    # #4 (0.209) Diameter Hole3 at 3: cut by f_4_0_209_diameter_hole3_at_3_tool
    add(f_4_0_209_diameter_hole3_at_3_tool.part, mode=Mode.SUBTRACT)


with BuildPart() as f_4_0_209_diameter_hole3_at_4_tool:
    # #4 (0.209) Diameter Hole3 at 4: #4 (0.209) Diameter Hole3 ×2
    with Locations(*[(i * F_4_0_209_DIAMETER_HOLE3_AT_4_PITCH, 0, 0) for i in range(1, F_4_0_209_DIAMETER_HOLE3_AT_4_COUNT)]):
        add(f_4_0_209_diameter_hole3)


with BuildPart() as part_4:
    add(part_3.part)

    # #4 (0.209) Diameter Hole3 at 4: cut by f_4_0_209_diameter_hole3_at_4_tool
    add(f_4_0_209_diameter_hole3_at_4_tool.part, mode=Mode.SUBTRACT)


with BuildPart() as body_3_1:
    add(body_3.part)

    # #4 (0.209) Diameter Hole3 at 4: cut by f_4_0_209_diameter_hole3_at_4_tool
    add(f_4_0_209_diameter_hole3_at_4_tool.part, mode=Mode.SUBTRACT)


solid = Compound([body_2_1.part, body_4_1.part, body_5_1.part, part_4.part, body_3_1.part])
